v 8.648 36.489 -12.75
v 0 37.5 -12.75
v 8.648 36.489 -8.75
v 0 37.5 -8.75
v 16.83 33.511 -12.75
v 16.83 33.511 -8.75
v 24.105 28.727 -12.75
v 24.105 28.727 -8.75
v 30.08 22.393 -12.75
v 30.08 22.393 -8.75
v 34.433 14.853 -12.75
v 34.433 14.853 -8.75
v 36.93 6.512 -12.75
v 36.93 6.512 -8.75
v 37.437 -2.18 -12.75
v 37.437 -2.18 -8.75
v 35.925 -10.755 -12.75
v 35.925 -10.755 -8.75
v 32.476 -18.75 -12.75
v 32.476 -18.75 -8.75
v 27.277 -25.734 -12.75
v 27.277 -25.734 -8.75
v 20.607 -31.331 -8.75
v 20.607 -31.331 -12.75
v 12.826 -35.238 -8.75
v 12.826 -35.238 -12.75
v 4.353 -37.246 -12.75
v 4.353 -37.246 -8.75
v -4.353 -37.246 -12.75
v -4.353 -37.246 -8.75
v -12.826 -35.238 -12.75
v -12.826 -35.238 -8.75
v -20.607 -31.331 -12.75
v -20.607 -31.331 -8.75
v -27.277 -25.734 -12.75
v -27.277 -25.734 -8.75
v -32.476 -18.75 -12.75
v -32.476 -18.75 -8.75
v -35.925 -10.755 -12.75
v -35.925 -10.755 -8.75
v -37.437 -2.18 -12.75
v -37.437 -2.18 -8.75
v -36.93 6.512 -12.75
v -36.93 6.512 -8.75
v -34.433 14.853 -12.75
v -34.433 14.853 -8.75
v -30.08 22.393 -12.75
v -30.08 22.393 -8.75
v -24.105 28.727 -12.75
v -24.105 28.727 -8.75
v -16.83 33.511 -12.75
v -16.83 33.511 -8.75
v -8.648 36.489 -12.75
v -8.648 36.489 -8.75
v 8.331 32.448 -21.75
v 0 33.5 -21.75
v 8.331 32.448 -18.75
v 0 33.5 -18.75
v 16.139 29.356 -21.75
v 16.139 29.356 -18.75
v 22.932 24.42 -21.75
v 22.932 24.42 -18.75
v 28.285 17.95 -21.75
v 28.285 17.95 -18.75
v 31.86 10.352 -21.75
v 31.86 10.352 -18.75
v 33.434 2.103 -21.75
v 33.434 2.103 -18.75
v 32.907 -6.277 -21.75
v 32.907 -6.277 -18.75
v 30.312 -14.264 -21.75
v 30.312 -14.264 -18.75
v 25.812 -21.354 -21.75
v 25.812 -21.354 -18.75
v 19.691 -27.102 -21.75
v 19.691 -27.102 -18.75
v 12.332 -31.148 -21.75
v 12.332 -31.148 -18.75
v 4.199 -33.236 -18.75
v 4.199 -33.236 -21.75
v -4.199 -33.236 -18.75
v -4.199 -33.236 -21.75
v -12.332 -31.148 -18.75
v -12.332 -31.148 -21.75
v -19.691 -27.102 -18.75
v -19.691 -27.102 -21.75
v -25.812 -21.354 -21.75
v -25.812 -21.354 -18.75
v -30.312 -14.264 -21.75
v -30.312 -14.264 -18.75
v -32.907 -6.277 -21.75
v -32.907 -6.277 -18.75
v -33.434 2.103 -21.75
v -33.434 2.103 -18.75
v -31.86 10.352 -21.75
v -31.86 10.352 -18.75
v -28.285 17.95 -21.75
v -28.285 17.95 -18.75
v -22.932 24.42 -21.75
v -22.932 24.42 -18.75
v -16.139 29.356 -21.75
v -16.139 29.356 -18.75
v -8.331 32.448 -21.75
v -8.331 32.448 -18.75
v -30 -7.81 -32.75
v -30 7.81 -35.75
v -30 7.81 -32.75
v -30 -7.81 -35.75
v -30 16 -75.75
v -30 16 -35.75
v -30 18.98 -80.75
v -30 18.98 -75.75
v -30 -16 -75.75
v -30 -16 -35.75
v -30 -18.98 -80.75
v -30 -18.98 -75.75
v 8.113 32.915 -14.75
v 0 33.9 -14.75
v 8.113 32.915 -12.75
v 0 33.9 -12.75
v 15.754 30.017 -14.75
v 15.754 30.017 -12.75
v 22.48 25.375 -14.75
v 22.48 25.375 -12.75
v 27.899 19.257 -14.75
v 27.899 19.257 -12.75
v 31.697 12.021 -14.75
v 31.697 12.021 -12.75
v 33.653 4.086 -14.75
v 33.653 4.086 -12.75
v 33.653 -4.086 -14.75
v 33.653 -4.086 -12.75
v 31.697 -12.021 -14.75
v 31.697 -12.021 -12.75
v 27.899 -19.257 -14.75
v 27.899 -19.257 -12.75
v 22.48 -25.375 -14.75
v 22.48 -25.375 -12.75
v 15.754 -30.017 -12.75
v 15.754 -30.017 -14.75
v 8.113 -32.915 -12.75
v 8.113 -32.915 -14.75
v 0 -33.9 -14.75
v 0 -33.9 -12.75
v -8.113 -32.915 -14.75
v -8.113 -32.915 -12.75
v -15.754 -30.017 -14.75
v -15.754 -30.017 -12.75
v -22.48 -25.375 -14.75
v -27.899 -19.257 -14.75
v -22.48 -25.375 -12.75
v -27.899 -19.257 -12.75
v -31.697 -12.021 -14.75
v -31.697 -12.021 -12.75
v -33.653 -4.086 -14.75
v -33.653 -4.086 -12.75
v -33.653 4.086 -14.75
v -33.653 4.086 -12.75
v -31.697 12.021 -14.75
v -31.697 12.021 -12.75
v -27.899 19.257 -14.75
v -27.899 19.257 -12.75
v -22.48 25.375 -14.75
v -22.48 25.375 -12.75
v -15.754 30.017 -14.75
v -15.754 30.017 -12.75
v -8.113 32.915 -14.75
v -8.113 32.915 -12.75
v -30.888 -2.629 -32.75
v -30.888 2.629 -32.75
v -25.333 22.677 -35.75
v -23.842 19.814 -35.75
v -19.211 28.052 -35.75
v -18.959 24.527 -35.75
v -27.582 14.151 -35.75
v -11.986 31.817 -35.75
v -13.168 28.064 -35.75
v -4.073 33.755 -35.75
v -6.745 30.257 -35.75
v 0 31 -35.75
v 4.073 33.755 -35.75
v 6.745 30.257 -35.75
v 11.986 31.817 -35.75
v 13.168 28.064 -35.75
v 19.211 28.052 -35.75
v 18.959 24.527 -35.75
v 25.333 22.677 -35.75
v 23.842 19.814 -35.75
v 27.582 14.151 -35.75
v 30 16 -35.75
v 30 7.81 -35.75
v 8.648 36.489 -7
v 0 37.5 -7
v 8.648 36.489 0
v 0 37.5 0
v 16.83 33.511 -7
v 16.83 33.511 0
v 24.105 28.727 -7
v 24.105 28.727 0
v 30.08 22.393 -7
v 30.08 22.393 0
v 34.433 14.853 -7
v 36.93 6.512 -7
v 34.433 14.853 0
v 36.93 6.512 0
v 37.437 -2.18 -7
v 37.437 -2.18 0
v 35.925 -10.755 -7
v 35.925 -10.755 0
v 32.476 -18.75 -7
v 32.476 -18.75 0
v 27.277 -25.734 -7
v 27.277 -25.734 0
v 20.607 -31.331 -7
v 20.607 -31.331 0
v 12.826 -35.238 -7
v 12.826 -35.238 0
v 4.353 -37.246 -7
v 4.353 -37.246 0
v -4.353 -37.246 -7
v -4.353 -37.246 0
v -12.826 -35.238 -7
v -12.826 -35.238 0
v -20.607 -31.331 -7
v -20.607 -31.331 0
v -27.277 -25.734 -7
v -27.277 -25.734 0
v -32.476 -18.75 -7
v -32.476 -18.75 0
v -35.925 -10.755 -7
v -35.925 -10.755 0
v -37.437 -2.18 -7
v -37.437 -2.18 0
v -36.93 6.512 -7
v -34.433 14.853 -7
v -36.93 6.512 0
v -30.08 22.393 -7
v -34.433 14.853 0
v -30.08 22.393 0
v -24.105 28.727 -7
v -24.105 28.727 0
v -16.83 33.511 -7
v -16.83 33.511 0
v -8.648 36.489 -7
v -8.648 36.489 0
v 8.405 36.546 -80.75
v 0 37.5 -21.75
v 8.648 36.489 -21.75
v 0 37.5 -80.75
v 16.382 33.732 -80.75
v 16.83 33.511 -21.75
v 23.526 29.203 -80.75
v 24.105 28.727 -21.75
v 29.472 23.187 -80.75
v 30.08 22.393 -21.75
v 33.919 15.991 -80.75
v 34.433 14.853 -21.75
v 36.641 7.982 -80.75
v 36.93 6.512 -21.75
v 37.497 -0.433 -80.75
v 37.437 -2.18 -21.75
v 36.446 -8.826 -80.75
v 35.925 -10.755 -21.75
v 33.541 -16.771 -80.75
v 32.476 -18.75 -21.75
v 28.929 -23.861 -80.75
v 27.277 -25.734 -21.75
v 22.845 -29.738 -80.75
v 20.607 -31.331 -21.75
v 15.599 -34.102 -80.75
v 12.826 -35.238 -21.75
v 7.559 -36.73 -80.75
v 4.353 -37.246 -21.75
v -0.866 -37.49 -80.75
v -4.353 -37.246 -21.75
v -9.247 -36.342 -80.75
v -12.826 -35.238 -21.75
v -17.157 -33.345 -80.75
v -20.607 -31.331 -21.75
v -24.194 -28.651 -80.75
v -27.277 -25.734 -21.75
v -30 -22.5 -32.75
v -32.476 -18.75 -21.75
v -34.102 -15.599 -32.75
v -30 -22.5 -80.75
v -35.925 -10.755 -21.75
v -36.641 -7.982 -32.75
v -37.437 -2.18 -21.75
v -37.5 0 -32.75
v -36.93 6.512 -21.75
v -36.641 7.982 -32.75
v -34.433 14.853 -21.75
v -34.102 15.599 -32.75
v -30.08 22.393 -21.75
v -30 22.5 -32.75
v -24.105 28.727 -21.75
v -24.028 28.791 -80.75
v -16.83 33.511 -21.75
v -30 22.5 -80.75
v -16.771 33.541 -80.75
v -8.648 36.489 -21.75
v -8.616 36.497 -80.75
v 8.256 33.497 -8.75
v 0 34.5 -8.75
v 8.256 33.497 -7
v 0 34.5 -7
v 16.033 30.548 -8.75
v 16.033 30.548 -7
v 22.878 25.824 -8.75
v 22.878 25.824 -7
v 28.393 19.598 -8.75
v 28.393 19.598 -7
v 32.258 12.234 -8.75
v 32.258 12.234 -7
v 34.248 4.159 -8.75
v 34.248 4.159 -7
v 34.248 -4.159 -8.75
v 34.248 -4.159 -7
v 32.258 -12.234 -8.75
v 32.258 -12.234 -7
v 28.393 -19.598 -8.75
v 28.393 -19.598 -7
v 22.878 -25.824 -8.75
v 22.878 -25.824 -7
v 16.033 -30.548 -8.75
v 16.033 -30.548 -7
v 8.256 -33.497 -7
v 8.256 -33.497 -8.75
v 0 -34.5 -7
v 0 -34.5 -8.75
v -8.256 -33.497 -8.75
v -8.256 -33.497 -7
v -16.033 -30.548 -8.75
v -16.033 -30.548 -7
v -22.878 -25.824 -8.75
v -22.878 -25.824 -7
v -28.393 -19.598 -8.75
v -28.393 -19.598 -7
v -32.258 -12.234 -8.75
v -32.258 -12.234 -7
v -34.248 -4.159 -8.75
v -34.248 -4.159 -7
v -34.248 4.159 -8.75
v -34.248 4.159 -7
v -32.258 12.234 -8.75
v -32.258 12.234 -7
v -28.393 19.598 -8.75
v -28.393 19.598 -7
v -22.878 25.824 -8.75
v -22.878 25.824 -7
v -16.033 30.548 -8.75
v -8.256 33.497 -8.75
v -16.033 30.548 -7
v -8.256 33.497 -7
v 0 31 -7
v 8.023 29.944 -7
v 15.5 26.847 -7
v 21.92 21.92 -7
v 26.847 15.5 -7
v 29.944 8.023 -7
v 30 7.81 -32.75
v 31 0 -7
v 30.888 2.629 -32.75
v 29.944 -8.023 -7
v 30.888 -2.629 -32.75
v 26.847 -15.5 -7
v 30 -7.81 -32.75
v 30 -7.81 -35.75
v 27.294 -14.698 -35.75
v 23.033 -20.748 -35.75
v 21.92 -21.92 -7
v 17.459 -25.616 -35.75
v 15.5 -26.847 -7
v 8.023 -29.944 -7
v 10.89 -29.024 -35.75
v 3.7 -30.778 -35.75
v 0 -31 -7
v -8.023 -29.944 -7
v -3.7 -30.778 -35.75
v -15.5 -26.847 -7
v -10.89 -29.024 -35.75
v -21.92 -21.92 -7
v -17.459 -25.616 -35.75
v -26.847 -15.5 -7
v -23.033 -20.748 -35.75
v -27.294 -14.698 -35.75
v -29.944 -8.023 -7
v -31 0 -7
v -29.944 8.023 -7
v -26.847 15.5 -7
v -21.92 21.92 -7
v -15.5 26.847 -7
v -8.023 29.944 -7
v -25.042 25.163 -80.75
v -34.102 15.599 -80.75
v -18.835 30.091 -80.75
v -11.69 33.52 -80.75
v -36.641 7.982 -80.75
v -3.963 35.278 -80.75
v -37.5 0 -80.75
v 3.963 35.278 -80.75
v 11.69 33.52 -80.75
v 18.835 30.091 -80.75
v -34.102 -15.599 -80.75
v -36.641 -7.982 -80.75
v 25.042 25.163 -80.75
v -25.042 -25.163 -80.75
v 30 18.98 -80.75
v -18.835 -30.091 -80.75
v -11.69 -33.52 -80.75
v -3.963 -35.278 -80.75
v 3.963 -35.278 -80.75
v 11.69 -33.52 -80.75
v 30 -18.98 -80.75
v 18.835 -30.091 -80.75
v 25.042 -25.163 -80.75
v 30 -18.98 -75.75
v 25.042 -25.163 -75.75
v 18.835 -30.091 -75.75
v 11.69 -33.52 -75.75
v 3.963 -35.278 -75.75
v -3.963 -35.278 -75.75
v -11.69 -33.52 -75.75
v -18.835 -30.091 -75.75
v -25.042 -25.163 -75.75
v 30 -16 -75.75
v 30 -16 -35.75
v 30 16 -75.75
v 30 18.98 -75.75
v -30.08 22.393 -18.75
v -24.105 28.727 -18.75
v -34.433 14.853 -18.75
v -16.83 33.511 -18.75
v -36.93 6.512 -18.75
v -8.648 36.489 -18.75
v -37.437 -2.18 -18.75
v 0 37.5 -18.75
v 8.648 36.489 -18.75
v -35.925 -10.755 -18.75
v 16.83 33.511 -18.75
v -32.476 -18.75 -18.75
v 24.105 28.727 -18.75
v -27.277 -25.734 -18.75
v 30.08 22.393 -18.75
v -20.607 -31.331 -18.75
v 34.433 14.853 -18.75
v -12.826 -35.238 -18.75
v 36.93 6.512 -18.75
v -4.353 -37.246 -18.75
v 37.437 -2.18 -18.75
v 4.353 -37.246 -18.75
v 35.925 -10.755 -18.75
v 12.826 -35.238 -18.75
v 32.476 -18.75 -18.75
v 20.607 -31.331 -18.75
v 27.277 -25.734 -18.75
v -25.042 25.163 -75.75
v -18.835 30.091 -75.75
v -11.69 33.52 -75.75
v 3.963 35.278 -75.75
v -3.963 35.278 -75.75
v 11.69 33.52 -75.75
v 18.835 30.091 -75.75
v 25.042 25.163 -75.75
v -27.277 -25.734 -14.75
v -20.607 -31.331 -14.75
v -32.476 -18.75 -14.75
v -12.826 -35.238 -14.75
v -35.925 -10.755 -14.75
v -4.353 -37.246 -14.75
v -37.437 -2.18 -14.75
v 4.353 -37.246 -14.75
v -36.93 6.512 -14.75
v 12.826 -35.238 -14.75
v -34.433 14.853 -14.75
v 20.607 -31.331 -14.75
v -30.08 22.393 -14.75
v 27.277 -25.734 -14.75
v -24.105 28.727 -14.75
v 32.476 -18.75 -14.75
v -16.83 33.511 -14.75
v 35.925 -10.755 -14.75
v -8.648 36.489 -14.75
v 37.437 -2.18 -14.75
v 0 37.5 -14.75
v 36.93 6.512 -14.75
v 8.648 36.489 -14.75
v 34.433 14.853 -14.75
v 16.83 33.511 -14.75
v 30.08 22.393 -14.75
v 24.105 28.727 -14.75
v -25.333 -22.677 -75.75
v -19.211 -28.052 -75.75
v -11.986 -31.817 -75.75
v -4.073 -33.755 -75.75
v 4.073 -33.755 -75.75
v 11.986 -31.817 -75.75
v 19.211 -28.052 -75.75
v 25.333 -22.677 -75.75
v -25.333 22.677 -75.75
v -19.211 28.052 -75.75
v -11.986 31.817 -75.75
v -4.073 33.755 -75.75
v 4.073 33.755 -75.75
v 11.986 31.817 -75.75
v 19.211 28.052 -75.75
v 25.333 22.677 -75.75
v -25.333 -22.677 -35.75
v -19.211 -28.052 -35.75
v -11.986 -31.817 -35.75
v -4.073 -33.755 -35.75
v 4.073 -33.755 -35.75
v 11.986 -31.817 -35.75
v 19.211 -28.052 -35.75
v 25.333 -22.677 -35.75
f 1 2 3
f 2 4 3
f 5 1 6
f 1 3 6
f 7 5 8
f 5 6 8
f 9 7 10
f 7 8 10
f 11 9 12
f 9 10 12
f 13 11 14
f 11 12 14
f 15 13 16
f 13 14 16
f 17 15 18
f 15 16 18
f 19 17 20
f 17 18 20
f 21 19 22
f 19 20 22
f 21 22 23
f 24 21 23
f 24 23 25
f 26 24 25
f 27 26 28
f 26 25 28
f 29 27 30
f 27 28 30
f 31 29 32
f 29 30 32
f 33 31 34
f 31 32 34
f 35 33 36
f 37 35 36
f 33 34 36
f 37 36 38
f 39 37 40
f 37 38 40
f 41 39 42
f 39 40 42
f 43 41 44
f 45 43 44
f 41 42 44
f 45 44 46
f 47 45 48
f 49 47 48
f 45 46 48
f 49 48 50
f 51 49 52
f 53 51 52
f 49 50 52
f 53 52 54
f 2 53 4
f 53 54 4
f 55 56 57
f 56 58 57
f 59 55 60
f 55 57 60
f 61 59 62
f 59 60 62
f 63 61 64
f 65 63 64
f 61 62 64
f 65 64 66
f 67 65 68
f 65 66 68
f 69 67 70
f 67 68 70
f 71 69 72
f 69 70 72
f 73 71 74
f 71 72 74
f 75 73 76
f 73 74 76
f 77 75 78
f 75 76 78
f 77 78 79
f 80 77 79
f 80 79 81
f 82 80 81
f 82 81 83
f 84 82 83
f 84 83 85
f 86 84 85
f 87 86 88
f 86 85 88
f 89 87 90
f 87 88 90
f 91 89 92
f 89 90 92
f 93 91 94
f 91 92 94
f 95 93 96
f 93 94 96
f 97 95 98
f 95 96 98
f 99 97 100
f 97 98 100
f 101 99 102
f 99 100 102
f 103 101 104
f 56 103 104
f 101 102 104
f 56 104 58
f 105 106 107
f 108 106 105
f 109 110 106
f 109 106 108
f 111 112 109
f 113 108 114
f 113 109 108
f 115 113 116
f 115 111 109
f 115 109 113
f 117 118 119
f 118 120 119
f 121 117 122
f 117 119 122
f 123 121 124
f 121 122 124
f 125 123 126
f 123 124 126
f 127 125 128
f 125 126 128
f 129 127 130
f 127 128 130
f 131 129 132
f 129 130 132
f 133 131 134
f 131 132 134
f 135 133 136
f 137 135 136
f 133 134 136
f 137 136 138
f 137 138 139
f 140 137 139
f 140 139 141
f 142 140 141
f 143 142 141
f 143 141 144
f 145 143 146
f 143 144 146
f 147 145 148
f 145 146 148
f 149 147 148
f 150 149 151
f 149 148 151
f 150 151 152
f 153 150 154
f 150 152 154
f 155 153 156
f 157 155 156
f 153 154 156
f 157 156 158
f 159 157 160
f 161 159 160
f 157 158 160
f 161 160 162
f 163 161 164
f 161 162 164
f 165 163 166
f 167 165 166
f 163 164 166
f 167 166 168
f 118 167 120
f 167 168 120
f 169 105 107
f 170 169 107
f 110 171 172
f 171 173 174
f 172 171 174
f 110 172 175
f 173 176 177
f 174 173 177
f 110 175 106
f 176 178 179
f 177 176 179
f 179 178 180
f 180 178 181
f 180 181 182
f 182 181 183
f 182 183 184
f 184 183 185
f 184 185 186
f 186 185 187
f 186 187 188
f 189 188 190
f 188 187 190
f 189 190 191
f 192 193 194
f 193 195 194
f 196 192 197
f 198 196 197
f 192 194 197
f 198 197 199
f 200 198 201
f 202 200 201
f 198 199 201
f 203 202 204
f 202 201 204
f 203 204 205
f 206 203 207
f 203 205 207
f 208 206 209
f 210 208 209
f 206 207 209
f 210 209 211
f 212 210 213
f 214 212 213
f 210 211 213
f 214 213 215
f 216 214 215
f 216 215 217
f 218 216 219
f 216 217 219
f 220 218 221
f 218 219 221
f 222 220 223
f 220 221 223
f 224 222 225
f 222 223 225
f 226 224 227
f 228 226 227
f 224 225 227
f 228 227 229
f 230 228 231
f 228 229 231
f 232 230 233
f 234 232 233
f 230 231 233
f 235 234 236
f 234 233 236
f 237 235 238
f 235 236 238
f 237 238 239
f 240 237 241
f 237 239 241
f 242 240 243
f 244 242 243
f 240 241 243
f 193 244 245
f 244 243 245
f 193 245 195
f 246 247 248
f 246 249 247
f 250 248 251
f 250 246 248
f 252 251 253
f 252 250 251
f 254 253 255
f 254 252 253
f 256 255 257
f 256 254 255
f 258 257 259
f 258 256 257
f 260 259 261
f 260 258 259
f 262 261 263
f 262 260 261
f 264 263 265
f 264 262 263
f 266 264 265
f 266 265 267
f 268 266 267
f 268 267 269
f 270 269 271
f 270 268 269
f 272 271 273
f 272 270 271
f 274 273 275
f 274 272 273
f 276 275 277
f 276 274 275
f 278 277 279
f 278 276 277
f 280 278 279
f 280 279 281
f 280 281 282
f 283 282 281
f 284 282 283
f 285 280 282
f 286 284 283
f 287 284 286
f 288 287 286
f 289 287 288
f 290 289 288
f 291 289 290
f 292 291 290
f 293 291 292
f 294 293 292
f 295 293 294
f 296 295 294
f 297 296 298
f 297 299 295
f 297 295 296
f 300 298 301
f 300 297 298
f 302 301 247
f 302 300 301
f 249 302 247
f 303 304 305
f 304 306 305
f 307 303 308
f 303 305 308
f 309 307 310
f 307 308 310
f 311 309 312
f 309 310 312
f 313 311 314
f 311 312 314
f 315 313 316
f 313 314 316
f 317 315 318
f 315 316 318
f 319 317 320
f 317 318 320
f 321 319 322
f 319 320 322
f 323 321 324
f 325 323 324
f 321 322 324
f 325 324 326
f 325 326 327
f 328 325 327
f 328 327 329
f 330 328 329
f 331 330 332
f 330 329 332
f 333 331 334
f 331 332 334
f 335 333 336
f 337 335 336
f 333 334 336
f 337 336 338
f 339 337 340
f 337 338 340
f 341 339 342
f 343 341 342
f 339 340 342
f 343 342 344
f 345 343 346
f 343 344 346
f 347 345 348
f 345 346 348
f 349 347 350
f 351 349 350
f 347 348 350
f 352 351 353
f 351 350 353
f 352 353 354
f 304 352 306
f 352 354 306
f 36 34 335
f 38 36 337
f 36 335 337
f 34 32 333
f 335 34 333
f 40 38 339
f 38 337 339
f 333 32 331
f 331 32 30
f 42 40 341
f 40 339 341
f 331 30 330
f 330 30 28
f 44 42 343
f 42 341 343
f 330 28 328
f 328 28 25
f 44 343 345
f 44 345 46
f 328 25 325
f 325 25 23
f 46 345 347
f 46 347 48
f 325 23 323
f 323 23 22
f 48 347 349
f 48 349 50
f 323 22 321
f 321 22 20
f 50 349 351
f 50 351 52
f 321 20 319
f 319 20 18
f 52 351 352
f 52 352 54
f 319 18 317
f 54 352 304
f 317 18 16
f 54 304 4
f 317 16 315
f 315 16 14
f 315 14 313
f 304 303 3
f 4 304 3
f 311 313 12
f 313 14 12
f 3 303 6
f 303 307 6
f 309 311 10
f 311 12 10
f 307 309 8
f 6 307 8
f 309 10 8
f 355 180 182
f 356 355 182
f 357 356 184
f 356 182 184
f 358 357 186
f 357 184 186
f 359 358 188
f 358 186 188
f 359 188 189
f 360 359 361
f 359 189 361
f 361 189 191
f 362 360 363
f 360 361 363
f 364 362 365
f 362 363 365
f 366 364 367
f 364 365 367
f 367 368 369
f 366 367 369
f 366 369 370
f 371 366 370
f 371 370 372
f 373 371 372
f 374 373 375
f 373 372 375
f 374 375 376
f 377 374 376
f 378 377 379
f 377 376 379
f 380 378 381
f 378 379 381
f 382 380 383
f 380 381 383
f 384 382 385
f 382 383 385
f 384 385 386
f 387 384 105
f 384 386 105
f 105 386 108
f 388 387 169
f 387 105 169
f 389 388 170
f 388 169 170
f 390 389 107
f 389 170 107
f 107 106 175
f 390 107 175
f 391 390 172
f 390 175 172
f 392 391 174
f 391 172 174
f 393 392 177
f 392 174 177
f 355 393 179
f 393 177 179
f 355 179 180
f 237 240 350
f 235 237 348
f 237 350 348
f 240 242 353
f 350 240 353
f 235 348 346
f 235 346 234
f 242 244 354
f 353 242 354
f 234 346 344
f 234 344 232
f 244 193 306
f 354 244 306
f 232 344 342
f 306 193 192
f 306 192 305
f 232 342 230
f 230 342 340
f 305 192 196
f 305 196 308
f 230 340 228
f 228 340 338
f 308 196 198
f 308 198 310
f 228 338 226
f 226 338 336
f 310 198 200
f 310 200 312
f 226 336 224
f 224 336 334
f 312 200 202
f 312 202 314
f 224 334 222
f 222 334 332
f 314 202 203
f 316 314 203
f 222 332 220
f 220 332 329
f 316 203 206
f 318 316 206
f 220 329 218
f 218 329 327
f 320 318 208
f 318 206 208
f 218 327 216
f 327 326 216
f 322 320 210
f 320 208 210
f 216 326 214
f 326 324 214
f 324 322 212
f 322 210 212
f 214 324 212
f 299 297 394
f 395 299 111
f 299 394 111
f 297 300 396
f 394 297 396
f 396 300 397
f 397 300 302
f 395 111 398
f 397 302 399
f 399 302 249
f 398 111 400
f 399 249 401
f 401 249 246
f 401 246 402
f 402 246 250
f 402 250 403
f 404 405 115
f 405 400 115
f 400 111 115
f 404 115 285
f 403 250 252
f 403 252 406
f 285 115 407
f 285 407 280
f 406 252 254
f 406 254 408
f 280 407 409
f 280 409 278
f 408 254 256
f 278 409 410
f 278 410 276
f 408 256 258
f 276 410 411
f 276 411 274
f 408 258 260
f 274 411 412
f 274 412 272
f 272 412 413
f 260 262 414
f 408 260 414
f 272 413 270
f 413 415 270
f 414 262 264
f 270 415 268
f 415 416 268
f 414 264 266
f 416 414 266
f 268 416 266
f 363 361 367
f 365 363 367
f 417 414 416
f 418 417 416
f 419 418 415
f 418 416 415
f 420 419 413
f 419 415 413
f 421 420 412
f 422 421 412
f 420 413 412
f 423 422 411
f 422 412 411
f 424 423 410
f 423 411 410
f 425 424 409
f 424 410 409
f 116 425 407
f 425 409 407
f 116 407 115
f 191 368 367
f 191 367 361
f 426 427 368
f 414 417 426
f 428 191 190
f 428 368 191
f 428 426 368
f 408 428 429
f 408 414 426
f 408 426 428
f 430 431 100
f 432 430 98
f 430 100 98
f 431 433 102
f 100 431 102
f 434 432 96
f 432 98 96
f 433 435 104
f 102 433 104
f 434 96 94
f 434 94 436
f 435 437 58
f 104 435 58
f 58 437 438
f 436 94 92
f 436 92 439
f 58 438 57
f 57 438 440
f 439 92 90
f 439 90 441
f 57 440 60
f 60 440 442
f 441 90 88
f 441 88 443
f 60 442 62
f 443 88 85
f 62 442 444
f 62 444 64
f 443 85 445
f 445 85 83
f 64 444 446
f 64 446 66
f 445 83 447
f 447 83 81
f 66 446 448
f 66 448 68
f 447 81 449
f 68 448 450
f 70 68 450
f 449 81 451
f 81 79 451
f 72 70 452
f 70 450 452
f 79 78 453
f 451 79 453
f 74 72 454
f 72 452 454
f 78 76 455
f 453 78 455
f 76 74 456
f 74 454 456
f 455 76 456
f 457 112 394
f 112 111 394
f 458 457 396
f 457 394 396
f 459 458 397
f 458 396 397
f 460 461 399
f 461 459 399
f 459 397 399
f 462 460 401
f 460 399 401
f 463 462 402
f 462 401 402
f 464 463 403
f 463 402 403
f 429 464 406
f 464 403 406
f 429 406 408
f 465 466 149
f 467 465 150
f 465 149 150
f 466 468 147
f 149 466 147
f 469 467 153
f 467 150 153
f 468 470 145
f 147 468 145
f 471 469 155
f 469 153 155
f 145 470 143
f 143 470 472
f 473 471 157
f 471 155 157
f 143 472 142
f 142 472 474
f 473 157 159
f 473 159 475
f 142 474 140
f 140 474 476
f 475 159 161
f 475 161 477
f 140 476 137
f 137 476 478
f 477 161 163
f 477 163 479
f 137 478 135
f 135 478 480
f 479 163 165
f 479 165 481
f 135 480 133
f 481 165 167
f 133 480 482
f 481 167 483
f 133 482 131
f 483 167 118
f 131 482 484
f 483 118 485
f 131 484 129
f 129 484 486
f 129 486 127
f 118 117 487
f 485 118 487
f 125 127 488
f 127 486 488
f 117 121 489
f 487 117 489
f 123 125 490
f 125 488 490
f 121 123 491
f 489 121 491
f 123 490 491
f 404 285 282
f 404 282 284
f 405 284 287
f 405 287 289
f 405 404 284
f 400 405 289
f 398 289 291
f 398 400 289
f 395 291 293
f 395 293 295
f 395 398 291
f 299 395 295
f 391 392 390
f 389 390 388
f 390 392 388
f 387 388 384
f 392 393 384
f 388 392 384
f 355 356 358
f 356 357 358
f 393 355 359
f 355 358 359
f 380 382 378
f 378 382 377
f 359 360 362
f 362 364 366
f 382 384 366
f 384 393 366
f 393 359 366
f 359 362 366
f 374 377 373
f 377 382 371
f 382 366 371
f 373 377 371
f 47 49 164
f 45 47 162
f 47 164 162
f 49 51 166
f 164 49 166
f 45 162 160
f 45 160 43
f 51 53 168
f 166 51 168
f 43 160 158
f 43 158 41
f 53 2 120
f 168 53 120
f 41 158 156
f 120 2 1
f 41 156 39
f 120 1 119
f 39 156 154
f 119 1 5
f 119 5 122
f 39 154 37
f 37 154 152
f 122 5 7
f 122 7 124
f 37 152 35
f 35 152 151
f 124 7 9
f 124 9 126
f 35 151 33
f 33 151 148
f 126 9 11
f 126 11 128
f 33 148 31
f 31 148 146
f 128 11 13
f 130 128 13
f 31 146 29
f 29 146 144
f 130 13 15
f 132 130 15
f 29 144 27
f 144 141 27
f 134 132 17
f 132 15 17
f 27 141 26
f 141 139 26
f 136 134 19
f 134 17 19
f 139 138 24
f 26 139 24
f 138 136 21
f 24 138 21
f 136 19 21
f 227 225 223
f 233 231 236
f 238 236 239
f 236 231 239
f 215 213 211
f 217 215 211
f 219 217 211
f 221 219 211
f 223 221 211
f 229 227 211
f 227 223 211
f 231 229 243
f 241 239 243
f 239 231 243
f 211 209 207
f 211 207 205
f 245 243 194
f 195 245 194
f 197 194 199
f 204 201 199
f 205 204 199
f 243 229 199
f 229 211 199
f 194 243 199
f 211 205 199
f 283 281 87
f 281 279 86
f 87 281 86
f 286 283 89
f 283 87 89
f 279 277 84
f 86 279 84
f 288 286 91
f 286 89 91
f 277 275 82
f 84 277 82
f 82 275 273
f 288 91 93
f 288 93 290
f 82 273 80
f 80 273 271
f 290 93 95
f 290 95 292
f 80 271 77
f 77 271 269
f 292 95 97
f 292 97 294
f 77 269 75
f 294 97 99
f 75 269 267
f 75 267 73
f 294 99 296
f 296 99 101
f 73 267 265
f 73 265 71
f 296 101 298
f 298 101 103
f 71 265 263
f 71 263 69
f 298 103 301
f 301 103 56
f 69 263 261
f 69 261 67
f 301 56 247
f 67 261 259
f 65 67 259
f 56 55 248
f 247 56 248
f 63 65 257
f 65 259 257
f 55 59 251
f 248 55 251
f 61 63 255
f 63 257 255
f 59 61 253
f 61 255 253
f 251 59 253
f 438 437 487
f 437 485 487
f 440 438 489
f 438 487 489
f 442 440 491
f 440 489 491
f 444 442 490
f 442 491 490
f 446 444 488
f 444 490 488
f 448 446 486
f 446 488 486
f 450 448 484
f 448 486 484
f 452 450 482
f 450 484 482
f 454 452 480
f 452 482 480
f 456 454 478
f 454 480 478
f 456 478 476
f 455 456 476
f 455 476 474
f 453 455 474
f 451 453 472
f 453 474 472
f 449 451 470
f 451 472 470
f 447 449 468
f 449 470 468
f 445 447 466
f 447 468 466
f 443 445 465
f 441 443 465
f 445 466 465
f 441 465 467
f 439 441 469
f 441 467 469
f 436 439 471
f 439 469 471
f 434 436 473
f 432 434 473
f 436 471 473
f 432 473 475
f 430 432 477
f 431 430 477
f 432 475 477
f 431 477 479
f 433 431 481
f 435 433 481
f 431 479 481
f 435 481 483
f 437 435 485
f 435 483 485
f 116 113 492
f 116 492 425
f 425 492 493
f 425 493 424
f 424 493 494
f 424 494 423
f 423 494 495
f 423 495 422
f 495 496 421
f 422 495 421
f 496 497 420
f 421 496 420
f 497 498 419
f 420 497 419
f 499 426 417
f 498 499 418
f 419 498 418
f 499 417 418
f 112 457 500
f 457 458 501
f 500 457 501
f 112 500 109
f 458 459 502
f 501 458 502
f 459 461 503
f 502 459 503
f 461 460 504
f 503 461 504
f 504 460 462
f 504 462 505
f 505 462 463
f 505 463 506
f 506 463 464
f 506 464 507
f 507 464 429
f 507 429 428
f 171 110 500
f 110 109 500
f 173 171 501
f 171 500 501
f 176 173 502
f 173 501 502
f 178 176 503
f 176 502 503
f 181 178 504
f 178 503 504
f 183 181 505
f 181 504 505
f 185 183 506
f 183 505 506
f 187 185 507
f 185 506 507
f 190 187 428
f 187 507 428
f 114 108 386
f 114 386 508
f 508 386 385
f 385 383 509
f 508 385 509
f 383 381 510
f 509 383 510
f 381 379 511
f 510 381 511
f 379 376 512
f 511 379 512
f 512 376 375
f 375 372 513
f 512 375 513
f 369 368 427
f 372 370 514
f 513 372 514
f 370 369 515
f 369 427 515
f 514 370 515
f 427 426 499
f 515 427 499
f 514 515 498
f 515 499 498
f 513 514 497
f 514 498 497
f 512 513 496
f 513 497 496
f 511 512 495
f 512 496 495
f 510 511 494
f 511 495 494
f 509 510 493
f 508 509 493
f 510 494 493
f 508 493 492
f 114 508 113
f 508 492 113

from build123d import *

# Parameters (mm, degrees)
F3_DEPTH = 48


with BuildPart() as f1:
    # F0 (on Right) → F1 (revolve)
    with BuildSketch(Plane.YZ):
        Polygon((37.5, 0), (0, 0), (0, -7), (31, -7), (31, -35.75), (34, -35.75), (34, -75.75), (35.5, -75.75), (35.5, -80.75), (37.5, -80.75), (37.5, -21.75), (33.5, -21.75), (33.5, -18.75), (37.5, -18.75), (37.5, -14.75), (33.9, -14.75), (33.9, -12.75), (37.5, -12.75), (37.5, -8.75), (34.5, -8.75), (34.5, -7), (37.5, -7), align=None)
    revolve(axis=Axis((0, 0, -21.27509), (0, 0, -1)))

    # F2 (on face) → F3 (join)
    with BuildSketch(Plane(origin=(0, 0, -80.75), x_dir=(1, 0, 0), z_dir=(0, 0, -1))):
        with BuildLine():
            Line((-30, -22.5), (-30, 22.5))
            ThreePointArc((-30, 22.5), (-37.5, 0), (-30, -22.5))
        make_face()
        with BuildLine():
            ThreePointArc((30, -22.5), (37.5, 0), (30, 22.5))
            Line((30, 22.5), (30, -22.5))
        make_face()
    extrude(amount=-F3_DEPTH)


solid = f1.part
